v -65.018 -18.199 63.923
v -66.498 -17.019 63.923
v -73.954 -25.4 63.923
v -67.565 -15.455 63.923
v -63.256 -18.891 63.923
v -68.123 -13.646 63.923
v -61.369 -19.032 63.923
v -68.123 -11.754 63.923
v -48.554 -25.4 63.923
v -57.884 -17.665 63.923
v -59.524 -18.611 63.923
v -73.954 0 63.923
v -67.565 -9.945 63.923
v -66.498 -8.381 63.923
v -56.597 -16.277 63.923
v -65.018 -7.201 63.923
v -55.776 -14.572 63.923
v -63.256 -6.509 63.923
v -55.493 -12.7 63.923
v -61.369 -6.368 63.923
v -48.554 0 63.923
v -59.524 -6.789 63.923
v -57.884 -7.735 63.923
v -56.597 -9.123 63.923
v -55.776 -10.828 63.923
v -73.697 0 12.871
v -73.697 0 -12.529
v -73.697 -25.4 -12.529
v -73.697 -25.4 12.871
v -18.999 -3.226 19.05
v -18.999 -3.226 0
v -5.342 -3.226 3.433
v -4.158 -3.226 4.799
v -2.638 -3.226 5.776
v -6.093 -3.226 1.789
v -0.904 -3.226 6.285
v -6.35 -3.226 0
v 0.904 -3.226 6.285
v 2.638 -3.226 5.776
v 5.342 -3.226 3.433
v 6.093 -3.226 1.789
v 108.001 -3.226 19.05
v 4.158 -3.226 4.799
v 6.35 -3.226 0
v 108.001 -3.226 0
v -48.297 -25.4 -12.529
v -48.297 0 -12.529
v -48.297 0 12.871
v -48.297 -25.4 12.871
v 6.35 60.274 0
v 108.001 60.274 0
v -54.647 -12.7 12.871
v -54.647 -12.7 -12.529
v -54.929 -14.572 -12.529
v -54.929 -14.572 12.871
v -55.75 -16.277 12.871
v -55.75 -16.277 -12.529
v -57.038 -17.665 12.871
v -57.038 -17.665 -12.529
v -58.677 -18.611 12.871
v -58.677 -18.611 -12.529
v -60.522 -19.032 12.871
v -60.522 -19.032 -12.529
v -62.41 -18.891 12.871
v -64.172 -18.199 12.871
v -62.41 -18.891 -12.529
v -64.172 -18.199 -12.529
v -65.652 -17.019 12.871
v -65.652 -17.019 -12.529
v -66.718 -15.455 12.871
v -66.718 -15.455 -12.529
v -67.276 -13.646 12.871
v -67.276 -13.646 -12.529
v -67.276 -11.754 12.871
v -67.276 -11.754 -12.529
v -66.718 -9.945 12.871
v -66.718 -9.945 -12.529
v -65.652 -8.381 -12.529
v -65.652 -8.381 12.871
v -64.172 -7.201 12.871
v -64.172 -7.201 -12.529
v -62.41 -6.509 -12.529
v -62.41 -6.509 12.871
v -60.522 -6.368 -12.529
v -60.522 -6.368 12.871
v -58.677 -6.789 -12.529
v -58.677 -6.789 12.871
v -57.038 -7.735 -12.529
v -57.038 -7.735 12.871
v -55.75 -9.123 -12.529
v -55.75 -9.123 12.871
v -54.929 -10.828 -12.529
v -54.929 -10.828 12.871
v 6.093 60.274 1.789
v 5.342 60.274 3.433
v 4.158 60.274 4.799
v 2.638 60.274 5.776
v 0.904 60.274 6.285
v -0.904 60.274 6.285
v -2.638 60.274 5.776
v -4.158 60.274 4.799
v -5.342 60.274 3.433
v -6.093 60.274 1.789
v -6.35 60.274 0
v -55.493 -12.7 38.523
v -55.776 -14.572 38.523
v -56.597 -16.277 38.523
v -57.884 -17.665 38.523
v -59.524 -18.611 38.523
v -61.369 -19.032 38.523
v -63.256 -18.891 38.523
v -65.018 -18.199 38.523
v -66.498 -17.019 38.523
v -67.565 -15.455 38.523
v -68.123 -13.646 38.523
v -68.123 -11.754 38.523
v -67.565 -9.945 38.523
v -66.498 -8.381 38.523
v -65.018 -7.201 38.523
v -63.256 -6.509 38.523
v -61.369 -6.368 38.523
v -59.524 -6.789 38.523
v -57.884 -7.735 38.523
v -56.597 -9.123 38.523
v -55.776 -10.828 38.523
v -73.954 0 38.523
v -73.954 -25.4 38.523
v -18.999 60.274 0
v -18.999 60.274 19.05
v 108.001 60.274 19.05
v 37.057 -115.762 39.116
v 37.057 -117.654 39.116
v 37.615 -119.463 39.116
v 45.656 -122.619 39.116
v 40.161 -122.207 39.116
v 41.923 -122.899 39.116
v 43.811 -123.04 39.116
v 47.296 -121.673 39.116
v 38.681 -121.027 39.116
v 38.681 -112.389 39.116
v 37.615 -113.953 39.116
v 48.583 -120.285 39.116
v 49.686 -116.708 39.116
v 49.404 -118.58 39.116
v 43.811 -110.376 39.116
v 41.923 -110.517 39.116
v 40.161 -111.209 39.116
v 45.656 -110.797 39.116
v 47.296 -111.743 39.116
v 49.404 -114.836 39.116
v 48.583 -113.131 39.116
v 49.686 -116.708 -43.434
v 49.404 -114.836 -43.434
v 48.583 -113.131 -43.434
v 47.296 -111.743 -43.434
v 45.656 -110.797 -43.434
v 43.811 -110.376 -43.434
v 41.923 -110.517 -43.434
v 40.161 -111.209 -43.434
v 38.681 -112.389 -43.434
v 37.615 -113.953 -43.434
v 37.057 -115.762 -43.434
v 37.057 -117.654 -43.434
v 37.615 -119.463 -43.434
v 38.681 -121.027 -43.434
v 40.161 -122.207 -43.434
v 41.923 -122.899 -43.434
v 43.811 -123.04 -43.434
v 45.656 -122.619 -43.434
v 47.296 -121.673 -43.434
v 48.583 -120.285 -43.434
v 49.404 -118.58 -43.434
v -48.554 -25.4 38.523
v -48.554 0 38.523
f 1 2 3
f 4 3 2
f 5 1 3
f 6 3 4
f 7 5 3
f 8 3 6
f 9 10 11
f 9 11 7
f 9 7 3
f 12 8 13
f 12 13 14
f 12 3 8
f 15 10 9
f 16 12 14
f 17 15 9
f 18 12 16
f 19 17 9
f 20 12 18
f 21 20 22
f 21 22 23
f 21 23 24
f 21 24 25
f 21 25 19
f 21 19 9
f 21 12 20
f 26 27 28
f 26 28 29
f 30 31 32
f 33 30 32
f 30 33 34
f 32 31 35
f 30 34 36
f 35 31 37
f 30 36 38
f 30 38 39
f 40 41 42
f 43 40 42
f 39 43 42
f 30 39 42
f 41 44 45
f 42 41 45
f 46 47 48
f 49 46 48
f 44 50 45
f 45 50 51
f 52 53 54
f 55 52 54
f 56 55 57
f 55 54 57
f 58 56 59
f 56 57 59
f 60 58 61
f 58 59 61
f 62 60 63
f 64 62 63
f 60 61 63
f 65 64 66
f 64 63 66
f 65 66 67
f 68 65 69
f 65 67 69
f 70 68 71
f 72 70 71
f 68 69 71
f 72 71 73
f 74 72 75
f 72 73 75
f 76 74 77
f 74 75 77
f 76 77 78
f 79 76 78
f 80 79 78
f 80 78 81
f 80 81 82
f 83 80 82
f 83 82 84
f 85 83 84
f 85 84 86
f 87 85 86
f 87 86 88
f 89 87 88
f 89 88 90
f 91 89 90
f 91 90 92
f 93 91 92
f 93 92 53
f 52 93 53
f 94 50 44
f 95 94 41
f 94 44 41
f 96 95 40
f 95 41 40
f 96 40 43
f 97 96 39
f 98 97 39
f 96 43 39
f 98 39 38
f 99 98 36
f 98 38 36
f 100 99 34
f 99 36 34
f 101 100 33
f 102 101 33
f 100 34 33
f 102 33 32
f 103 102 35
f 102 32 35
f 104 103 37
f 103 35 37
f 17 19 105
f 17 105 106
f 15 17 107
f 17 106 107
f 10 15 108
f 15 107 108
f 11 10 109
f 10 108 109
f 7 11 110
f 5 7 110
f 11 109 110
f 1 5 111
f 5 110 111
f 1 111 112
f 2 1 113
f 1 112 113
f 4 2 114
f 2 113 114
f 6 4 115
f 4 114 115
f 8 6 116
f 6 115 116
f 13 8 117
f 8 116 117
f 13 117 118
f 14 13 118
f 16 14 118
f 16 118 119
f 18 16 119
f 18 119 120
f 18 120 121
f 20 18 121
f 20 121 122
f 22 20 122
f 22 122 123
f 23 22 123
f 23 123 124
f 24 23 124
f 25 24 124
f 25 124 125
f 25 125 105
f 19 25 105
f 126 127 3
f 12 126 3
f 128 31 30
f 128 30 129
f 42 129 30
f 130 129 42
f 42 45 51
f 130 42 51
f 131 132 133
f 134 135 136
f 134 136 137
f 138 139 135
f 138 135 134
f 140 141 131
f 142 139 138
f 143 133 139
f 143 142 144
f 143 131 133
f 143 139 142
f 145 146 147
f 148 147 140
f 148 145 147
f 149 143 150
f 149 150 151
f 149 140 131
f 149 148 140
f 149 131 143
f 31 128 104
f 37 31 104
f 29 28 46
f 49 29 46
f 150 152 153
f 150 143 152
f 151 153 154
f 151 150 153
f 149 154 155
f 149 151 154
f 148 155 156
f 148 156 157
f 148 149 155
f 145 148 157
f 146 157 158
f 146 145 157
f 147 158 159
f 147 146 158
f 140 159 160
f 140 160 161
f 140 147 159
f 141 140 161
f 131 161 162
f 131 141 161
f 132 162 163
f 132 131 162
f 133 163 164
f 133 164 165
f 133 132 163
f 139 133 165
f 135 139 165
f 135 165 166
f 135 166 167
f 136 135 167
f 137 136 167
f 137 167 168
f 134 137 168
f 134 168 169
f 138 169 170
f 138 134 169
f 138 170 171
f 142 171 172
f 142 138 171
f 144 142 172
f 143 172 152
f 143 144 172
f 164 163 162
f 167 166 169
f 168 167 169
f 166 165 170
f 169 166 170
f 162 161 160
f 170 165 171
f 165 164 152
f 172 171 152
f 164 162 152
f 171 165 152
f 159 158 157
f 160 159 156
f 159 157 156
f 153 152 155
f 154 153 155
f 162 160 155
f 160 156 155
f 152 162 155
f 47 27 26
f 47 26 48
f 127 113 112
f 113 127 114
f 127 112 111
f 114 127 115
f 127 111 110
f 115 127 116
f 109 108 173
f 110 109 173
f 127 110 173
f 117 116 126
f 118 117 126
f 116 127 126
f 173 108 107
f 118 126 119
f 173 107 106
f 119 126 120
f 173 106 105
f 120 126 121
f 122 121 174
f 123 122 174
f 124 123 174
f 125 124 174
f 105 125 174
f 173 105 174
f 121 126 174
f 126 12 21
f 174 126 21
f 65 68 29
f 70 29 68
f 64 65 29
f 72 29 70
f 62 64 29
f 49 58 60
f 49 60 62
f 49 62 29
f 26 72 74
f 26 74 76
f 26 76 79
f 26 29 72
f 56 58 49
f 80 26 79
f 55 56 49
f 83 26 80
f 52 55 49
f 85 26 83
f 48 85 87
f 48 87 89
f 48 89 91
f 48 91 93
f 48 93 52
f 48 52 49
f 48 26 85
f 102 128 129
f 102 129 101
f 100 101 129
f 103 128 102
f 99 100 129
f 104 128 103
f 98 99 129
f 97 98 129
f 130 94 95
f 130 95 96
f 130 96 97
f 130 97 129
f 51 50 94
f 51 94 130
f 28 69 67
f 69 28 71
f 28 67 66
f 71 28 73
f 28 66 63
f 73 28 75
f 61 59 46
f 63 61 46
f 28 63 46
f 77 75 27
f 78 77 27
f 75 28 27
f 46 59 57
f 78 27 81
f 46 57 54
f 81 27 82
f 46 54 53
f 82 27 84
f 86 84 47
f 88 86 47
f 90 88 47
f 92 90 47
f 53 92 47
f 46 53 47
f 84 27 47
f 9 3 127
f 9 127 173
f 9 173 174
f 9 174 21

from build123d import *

# Parameters (mm, degrees)
F1_W      = 127
F1_H      = 63.5
F2_DEPTH  = 19.05
F3_R      = 6.35
F4_DEPTH  = 88.392
F0_R      = 6.35
F5_DEPTH  = 39.116
F6_DEPTH  = 43.434
F7_W      = 25.4
F7_H      = 25.4
F8_DEPTH  = 25.4
F10_DEPTH = 25.4
F11_R     = 6.35
F12_DEPTH = 47.244
F9_R      = 6.35
F13_DEPTH = 46.99


# Not quite as in the source:
# - a feature names something its author has since deleted; it is built from what else it names


with BuildPart() as f2:
    # F1 (on Top) → F2 (new body)
    with BuildSketch(Plane.XY):
        with Locations((44.5008012414, 28.5242010134)):
            Rectangle(F1_W, F1_H)
    extrude(amount=F2_DEPTH)

    # F3 (on face) → F4 (cut)
    with BuildSketch(Plane.XZ.offset(3.2257989866)):
        Circle(F3_R)
    extrude(amount=-F4_DEPTH, mode=Mode.SUBTRACT)


with BuildPart() as f5:
    # F0 (on Top) → F5 (new body)
    with BuildSketch(Plane.XY):
        with Locations((43.3363690972, -116.7080551386)):
            Circle(F0_R)
    extrude(amount=F5_DEPTH)

    # F6 (add): a face of the model
    f6_faces = [f5.faces().sort_by_distance(p)[0] for p in [
        (43.3363690972, -116.7080551386, 0),
    ]]
    extrude(f6_faces, amount=F6_DEPTH)


with BuildPart() as f8:
    # F7 (on Front) → F8 (new body)
    with BuildSketch(Plane.XZ):
        with Locations((-61.2544928074, 51.2233350098)):
            Rectangle(F7_W, F7_H)
    extrude(amount=F8_DEPTH)

    # F9 (on face) → F13 (cut)
    with BuildSketch(Plane(origin=(0, 0, 38.5233350098), x_dir=(1, 0, 0), z_dir=(0, 0, -1))):
        with Locations((-61.8434809148, 12.7)):
            Circle(F9_R)
    extrude(amount=-F13_DEPTH, mode=Mode.SUBTRACT)


with BuildPart() as f10:
    # F7 (on Front) → F10 (new body)
    with BuildSketch(Plane.XZ):
        with Locations((-60.9968144774, 0.1707609415)):
            Rectangle(F7_W, F7_H)
    extrude(amount=F10_DEPTH)

    # F11 (on face) → F12 (cut)
    with BuildSketch(Plane(origin=(0, 0, -12.5292390585), x_dir=(1, 0, 0), z_dir=(0, 0, -1))):
        with Locations((-60.9968144774, 12.7)):
            Circle(F11_R)
    extrude(amount=-F12_DEPTH, mode=Mode.SUBTRACT)


solid = Compound([f2.part, f5.part, f8.part, f10.part])
